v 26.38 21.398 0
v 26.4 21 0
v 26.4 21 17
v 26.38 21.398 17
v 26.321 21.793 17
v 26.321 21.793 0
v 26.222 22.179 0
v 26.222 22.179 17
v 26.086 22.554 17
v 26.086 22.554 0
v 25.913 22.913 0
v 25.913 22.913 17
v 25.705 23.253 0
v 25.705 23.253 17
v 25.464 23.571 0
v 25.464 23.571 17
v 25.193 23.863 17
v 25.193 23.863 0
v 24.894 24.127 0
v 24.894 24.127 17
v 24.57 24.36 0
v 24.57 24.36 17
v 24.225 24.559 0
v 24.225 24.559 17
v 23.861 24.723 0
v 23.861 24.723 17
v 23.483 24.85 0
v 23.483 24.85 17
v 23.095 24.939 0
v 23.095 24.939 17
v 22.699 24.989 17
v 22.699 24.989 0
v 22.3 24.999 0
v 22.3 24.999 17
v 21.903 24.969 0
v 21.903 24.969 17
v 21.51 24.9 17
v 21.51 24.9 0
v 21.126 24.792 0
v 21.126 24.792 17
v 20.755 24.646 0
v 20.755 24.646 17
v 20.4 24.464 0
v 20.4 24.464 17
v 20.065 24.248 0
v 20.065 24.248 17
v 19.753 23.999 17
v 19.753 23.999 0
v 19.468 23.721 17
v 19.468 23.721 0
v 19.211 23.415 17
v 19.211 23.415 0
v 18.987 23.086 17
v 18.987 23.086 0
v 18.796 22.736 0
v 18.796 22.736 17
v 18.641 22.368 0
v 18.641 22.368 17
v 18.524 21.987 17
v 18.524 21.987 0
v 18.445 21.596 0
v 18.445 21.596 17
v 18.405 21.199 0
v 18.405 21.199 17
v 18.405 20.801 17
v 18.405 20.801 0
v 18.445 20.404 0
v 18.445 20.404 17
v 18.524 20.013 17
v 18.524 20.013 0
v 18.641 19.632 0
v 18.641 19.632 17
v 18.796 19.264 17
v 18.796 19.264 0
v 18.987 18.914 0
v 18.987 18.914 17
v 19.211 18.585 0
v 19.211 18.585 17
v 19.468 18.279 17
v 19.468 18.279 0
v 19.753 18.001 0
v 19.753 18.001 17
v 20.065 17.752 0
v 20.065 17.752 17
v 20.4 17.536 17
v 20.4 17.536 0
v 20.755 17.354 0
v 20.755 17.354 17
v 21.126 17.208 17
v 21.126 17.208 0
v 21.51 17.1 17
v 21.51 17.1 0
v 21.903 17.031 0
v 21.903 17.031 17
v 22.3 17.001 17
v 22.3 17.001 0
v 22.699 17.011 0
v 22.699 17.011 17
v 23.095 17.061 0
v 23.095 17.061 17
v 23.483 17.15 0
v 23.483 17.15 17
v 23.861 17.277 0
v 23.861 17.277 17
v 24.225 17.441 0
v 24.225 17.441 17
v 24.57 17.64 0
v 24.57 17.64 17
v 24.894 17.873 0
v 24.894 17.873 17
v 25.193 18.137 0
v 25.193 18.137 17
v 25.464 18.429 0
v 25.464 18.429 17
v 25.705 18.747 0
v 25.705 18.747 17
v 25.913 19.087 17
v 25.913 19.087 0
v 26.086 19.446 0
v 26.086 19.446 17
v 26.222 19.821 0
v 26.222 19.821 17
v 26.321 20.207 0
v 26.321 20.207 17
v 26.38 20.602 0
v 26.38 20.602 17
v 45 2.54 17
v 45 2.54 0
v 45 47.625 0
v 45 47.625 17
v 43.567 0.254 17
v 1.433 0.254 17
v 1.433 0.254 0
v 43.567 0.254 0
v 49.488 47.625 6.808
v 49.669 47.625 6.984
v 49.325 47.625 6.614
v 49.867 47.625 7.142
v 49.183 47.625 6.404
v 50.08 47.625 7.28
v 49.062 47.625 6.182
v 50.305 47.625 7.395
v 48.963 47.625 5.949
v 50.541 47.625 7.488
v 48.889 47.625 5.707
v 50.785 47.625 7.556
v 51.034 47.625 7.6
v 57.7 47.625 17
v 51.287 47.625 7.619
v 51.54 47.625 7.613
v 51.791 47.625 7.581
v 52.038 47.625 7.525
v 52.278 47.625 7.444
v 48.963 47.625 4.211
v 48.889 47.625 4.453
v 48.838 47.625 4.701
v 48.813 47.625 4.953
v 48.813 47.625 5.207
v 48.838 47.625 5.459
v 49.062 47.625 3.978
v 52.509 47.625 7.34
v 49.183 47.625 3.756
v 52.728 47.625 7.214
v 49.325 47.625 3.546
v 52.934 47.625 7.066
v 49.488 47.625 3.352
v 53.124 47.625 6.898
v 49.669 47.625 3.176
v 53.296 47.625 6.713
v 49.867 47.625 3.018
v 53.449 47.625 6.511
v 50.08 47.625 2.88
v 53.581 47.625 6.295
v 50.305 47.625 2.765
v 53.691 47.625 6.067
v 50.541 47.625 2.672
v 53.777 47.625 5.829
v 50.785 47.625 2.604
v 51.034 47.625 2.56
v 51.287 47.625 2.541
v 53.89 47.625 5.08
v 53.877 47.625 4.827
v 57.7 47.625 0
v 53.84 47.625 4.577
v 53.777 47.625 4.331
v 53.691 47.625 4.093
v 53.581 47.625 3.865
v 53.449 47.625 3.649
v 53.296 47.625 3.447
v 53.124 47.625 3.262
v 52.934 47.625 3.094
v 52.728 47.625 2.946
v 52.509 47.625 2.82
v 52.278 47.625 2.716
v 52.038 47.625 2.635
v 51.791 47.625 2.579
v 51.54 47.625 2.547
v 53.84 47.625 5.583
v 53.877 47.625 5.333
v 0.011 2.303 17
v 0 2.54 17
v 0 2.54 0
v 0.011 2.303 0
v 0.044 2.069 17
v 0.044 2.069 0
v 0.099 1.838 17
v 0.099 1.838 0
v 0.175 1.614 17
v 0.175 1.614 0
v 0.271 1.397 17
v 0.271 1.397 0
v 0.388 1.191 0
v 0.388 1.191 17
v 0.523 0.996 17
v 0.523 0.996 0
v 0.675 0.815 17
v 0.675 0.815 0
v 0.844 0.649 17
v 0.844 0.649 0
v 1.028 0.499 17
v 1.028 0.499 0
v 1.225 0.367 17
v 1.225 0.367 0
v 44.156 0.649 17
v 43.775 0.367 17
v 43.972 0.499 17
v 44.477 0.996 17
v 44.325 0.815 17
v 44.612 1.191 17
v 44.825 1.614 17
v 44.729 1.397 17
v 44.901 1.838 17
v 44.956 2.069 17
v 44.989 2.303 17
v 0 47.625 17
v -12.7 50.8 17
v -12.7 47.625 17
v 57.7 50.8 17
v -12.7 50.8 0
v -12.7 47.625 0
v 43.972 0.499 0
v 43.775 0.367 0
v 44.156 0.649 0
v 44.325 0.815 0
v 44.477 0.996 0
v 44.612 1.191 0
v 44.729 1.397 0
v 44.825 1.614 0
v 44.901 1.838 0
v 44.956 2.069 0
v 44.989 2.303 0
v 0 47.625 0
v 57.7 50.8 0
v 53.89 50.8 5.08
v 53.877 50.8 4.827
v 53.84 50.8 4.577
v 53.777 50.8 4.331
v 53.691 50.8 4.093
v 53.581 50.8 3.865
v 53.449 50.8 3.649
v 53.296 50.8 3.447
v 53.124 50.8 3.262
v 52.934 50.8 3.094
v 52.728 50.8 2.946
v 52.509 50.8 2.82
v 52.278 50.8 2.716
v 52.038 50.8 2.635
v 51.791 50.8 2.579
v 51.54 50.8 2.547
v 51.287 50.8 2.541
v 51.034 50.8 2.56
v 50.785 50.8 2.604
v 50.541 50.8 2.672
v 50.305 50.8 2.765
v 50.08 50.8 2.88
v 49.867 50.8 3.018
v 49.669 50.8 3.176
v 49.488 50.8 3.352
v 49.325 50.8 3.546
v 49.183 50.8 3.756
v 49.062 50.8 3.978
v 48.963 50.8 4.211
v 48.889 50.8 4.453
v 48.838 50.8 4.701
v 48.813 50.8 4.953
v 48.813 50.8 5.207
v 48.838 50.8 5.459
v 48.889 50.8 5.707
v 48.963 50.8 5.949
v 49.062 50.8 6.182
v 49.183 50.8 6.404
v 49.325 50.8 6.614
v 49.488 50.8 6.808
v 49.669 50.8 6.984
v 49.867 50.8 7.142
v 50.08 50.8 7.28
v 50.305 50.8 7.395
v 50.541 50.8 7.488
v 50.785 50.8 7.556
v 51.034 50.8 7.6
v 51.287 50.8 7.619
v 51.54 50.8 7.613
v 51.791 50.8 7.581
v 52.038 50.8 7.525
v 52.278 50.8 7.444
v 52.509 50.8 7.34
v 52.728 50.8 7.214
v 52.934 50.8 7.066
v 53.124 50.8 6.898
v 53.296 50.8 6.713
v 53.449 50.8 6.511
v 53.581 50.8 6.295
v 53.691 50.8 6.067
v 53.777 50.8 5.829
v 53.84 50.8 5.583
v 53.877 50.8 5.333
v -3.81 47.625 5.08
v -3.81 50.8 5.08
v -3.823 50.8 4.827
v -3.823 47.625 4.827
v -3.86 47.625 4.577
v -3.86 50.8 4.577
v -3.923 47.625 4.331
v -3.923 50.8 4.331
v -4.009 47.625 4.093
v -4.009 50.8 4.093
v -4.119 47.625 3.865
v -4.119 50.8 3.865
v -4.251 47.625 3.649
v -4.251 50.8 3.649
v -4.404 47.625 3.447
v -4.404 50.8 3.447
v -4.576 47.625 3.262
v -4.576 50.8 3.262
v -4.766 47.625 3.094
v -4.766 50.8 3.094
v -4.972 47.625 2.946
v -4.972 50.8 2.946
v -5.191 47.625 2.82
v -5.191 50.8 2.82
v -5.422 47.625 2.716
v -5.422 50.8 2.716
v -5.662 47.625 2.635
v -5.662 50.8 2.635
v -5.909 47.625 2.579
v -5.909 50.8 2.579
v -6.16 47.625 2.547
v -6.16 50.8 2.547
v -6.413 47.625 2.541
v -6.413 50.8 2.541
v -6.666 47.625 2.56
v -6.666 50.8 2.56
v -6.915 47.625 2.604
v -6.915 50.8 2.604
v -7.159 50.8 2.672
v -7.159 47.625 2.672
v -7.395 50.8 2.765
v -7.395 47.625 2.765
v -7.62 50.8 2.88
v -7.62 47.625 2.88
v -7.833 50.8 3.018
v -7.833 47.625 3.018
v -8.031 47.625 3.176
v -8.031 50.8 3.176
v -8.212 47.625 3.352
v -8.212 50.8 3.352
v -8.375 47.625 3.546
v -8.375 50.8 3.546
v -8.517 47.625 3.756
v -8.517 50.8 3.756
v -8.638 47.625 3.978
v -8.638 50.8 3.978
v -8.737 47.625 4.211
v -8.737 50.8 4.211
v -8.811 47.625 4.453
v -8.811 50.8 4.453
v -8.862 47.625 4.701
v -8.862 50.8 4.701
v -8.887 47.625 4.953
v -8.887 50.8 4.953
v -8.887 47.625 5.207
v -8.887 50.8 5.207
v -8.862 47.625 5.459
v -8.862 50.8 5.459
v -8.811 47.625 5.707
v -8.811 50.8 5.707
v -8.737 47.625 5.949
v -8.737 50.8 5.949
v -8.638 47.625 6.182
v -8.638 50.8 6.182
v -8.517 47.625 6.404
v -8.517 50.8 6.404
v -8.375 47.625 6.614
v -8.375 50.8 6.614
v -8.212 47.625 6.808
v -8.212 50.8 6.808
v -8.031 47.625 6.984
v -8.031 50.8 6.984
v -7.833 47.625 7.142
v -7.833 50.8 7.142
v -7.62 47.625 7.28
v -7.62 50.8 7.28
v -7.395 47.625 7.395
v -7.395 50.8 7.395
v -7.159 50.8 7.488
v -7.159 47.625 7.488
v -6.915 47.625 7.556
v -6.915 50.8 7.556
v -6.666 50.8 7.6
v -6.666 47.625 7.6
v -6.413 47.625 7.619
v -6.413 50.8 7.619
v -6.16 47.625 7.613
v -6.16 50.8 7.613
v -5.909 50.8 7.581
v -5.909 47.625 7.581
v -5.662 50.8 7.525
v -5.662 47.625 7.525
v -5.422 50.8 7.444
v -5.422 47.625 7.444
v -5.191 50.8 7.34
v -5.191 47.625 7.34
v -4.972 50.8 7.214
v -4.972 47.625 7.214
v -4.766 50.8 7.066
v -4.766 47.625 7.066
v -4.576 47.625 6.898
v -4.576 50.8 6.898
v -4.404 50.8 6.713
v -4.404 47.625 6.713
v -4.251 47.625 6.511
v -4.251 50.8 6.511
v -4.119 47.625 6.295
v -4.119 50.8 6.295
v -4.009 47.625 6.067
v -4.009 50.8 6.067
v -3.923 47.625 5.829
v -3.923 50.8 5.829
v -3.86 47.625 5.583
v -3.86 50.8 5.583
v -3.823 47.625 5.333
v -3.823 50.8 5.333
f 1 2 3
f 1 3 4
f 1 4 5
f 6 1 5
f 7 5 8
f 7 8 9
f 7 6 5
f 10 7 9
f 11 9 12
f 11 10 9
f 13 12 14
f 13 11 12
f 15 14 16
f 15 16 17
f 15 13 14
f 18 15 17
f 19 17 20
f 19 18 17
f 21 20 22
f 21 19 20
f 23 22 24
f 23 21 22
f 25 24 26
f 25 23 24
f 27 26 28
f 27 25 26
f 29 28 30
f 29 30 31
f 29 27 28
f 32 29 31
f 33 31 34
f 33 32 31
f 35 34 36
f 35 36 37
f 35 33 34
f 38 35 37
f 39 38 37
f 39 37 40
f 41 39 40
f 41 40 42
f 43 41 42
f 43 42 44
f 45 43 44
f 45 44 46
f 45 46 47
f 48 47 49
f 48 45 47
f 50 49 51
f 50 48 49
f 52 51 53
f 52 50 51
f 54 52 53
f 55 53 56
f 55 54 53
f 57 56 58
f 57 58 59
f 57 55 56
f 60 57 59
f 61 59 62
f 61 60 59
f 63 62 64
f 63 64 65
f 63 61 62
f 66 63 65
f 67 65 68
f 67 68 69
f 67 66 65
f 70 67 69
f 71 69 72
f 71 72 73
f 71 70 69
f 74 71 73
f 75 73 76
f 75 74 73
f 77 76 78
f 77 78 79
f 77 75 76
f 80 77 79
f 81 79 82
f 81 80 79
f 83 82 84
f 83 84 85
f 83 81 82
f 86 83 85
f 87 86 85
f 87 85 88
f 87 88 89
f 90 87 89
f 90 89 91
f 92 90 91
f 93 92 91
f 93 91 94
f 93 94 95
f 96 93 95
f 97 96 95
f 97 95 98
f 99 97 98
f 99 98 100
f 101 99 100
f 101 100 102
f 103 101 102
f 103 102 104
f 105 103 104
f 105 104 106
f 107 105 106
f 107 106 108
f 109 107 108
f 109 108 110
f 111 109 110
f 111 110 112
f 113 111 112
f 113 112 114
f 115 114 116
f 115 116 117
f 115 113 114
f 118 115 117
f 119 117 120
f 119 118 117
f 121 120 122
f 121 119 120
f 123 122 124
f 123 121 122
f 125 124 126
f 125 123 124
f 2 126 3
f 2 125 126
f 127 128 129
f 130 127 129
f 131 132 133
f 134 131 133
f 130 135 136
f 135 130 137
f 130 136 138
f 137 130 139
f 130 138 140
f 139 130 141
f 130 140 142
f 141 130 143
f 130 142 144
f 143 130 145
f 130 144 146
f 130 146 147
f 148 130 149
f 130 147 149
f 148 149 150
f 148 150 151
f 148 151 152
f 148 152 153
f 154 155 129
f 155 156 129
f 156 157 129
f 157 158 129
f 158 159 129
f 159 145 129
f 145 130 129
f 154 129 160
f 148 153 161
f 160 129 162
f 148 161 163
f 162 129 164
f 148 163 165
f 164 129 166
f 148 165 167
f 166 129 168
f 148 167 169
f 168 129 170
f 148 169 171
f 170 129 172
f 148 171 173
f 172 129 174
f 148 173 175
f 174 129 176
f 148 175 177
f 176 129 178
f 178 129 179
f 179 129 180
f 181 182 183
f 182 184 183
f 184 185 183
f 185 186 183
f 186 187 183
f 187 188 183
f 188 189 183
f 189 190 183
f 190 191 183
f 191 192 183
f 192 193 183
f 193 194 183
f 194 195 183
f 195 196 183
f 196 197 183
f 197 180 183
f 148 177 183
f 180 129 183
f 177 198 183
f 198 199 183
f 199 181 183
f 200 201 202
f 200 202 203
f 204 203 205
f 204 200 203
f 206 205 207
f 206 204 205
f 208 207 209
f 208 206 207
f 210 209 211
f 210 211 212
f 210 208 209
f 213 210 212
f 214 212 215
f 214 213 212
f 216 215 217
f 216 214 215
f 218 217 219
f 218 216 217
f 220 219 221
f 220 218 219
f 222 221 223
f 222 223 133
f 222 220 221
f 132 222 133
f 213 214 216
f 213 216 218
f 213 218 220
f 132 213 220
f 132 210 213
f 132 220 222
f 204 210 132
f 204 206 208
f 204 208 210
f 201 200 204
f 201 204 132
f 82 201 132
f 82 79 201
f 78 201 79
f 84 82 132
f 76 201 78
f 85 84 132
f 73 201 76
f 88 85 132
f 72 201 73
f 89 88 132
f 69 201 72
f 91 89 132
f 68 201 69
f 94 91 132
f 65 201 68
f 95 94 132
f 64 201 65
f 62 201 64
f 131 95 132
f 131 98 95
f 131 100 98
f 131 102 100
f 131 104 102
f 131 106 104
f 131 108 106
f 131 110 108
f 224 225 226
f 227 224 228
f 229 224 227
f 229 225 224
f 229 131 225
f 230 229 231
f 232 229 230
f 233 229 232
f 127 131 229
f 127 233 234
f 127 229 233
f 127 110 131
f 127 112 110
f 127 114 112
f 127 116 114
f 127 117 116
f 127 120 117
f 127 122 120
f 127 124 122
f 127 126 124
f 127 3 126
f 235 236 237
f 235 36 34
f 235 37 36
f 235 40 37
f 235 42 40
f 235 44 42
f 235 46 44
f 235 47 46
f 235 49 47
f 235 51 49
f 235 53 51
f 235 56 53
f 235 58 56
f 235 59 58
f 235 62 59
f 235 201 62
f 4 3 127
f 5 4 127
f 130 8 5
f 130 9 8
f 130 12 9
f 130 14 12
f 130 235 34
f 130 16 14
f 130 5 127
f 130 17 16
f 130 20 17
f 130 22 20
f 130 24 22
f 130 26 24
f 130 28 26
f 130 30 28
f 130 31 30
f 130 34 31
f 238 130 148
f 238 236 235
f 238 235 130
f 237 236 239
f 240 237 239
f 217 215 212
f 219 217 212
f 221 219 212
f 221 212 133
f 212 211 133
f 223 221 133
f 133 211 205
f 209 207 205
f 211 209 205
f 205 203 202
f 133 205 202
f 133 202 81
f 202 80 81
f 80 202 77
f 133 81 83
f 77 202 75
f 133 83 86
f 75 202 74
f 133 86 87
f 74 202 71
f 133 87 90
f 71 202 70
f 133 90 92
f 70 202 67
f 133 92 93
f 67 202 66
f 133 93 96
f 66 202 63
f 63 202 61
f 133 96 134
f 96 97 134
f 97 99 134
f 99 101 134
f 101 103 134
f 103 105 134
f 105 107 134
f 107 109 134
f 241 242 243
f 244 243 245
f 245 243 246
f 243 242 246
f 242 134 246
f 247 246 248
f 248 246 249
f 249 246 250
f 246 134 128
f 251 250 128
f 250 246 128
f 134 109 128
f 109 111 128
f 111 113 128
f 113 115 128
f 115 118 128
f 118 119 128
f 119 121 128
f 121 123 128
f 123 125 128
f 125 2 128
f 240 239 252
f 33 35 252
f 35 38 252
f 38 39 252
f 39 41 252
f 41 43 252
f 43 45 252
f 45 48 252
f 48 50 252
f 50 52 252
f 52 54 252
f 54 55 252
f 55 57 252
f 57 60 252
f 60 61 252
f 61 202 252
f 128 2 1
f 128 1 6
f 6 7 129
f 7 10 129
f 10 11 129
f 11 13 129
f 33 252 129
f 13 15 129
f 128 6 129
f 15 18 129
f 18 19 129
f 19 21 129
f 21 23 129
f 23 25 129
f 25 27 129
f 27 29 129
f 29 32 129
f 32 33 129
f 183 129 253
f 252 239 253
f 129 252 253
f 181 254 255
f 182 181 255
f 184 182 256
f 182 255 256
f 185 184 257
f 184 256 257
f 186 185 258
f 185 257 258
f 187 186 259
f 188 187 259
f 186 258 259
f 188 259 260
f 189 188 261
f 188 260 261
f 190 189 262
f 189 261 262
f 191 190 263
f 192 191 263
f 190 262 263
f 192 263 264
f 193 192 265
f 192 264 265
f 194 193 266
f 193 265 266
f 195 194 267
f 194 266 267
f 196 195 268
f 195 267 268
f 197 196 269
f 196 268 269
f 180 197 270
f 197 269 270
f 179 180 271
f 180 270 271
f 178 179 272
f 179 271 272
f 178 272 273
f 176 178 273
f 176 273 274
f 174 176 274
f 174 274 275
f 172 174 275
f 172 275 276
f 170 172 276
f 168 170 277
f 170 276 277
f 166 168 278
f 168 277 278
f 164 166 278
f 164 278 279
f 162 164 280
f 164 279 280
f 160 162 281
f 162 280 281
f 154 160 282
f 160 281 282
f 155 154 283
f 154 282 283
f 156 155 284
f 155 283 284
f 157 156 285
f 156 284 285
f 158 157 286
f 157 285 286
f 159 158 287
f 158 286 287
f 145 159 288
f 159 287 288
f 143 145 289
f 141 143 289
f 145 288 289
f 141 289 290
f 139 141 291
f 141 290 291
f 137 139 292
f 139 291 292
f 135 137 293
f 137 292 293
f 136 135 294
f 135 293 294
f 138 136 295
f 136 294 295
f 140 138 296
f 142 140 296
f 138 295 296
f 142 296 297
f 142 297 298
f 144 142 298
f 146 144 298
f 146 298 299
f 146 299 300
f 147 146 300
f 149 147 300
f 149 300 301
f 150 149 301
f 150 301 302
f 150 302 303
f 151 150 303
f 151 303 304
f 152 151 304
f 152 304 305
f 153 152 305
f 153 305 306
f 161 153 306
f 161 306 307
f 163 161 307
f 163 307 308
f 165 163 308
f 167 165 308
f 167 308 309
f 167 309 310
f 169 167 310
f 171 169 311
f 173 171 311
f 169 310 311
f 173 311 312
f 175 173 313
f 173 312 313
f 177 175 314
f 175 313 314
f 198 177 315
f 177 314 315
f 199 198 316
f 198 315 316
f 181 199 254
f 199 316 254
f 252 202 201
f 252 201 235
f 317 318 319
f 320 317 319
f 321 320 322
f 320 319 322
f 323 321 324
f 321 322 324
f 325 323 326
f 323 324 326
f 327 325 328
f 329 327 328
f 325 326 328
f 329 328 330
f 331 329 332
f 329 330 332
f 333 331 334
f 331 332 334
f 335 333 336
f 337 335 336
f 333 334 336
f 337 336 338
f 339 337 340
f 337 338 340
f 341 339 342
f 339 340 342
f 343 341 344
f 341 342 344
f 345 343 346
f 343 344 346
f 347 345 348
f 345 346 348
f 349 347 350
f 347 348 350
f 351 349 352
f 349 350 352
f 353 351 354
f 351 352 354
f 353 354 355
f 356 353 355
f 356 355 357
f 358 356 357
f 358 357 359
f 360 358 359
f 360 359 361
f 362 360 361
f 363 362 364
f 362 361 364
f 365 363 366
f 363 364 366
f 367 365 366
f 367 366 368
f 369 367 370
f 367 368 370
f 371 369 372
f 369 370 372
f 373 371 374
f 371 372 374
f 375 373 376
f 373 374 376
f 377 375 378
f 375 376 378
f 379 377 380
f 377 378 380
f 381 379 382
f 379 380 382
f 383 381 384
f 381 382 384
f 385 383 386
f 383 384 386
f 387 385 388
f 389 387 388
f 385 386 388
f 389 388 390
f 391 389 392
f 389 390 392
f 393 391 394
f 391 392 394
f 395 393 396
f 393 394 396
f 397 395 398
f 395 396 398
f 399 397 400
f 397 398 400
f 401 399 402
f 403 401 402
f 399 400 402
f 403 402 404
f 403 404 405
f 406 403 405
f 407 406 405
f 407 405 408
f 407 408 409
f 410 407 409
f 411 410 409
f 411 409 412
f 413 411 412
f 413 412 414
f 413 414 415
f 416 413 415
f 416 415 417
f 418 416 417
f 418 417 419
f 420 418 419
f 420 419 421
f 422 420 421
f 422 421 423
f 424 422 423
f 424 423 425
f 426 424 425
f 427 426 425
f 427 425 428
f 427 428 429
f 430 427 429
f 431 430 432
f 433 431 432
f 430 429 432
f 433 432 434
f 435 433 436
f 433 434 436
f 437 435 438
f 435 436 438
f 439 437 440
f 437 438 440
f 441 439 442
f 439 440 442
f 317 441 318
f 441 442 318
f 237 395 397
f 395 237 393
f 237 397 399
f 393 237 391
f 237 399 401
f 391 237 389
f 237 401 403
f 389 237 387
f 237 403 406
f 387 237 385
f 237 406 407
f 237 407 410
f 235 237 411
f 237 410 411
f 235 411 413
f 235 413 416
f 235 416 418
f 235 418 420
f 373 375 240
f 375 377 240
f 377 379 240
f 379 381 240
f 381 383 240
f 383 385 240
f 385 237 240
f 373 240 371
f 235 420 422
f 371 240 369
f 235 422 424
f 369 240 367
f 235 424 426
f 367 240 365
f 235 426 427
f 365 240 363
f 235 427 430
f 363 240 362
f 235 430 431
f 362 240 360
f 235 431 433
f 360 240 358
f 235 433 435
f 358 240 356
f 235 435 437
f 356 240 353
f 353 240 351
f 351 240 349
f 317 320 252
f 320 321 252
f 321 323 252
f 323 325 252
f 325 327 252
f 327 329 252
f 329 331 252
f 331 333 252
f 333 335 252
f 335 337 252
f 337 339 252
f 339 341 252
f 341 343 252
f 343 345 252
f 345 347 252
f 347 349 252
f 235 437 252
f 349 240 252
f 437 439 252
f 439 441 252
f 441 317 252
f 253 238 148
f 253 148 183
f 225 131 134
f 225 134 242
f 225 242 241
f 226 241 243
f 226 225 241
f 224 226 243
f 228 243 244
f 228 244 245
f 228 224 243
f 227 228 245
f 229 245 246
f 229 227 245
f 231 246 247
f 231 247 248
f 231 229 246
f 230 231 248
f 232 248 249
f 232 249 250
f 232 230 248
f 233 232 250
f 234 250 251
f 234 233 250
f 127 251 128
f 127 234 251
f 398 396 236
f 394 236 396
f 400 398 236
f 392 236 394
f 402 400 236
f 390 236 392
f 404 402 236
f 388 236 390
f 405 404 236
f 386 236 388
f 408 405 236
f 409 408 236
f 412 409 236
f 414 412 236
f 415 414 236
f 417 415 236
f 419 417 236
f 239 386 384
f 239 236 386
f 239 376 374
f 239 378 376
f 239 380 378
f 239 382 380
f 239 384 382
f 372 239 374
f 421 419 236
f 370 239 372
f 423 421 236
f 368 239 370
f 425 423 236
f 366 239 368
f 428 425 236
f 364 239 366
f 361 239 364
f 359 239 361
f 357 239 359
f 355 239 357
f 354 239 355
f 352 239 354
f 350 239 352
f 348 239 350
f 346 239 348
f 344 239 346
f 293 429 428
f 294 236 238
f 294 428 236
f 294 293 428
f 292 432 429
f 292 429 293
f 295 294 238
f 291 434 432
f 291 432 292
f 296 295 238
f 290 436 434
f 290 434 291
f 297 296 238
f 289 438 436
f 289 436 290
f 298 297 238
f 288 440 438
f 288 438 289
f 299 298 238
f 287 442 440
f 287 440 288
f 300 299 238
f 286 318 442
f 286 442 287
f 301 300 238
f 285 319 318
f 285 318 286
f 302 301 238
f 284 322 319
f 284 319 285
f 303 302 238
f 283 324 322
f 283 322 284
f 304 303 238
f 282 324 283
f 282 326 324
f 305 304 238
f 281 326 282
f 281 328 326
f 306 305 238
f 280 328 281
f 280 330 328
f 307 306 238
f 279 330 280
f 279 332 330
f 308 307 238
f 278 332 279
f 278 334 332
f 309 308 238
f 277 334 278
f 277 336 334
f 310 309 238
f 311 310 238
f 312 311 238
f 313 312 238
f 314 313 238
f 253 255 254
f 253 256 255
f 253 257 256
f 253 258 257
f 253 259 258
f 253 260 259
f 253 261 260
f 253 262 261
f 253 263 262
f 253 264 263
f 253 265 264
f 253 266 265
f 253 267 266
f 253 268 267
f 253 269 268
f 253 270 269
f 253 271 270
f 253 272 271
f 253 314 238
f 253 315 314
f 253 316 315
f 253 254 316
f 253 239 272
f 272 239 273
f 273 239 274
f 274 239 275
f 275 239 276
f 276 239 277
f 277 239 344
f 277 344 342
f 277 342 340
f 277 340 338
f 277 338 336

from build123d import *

# Parameters (mm, degrees)
SKETCH1_W           = 45
SKETCH1_H           = 50.8
SKETCH1_R           = 4
BOSS_EXTRUDE1_DEPTH = 17
FILLET1_R           = 2.54
SKETCH3_W           = 17
SKETCH3_H           = 0.254
CUT_EXTRUDE2_DEPTH  = 46
SKETCH4_W           = 12.7
SKETCH4_H           = 17
SKETCH4_R           = 2.54
BOSS_EXTRUDE2_DEPTH = 3.175


with BuildPart() as part:
    # Sketch1 → Boss-Extrude1 (new body)
    with BuildSketch(Plane.XY):
        with Locations((22.5, 25.4)):
            Rectangle(SKETCH1_W, SKETCH1_H)
        with Locations((22.4, 21)):
            Circle(SKETCH1_R, mode=Mode.SUBTRACT)
    extrude(amount=BOSS_EXTRUDE1_DEPTH)

    # Fillet1
    fillet1_edges = [part.edges().sort_by_distance(p)[0] for p in [
        (45, 0, 8.5),
        (0, 0, 8.5),
    ]]
    fillet(fillet1_edges, radius=FILLET1_R)

    # Sketch3 → Cut-Extrude2 (cut, through all)
    with BuildSketch(Plane(origin=(45, 0, 0), x_dir=(0, 0, -1), z_dir=(1, 0, 0))):
        with Locations((-8.5, 0.127)):
            Rectangle(SKETCH3_W, SKETCH3_H)
    extrude(amount=-CUT_EXTRUDE2_DEPTH, mode=Mode.SUBTRACT)

    # Sketch4 → Boss-Extrude2 (add)
    with BuildSketch(Plane(origin=(0, 50.8, 0), x_dir=(1, 0, 0), z_dir=(0, 1, 0))):
        with Locations((51.35, -8.5)):
            Rectangle(SKETCH4_W, SKETCH4_H)
        with Locations((51.35, -5.08)):
            Circle(SKETCH4_R, mode=Mode.SUBTRACT)
        with Locations((-6.35, -8.5)):
            Rectangle(SKETCH4_W, SKETCH4_H)
        with Locations((-6.35, -5.08)):
            Circle(SKETCH4_R, mode=Mode.SUBTRACT)
    extrude(amount=-BOSS_EXTRUDE2_DEPTH)


solid = part.part
